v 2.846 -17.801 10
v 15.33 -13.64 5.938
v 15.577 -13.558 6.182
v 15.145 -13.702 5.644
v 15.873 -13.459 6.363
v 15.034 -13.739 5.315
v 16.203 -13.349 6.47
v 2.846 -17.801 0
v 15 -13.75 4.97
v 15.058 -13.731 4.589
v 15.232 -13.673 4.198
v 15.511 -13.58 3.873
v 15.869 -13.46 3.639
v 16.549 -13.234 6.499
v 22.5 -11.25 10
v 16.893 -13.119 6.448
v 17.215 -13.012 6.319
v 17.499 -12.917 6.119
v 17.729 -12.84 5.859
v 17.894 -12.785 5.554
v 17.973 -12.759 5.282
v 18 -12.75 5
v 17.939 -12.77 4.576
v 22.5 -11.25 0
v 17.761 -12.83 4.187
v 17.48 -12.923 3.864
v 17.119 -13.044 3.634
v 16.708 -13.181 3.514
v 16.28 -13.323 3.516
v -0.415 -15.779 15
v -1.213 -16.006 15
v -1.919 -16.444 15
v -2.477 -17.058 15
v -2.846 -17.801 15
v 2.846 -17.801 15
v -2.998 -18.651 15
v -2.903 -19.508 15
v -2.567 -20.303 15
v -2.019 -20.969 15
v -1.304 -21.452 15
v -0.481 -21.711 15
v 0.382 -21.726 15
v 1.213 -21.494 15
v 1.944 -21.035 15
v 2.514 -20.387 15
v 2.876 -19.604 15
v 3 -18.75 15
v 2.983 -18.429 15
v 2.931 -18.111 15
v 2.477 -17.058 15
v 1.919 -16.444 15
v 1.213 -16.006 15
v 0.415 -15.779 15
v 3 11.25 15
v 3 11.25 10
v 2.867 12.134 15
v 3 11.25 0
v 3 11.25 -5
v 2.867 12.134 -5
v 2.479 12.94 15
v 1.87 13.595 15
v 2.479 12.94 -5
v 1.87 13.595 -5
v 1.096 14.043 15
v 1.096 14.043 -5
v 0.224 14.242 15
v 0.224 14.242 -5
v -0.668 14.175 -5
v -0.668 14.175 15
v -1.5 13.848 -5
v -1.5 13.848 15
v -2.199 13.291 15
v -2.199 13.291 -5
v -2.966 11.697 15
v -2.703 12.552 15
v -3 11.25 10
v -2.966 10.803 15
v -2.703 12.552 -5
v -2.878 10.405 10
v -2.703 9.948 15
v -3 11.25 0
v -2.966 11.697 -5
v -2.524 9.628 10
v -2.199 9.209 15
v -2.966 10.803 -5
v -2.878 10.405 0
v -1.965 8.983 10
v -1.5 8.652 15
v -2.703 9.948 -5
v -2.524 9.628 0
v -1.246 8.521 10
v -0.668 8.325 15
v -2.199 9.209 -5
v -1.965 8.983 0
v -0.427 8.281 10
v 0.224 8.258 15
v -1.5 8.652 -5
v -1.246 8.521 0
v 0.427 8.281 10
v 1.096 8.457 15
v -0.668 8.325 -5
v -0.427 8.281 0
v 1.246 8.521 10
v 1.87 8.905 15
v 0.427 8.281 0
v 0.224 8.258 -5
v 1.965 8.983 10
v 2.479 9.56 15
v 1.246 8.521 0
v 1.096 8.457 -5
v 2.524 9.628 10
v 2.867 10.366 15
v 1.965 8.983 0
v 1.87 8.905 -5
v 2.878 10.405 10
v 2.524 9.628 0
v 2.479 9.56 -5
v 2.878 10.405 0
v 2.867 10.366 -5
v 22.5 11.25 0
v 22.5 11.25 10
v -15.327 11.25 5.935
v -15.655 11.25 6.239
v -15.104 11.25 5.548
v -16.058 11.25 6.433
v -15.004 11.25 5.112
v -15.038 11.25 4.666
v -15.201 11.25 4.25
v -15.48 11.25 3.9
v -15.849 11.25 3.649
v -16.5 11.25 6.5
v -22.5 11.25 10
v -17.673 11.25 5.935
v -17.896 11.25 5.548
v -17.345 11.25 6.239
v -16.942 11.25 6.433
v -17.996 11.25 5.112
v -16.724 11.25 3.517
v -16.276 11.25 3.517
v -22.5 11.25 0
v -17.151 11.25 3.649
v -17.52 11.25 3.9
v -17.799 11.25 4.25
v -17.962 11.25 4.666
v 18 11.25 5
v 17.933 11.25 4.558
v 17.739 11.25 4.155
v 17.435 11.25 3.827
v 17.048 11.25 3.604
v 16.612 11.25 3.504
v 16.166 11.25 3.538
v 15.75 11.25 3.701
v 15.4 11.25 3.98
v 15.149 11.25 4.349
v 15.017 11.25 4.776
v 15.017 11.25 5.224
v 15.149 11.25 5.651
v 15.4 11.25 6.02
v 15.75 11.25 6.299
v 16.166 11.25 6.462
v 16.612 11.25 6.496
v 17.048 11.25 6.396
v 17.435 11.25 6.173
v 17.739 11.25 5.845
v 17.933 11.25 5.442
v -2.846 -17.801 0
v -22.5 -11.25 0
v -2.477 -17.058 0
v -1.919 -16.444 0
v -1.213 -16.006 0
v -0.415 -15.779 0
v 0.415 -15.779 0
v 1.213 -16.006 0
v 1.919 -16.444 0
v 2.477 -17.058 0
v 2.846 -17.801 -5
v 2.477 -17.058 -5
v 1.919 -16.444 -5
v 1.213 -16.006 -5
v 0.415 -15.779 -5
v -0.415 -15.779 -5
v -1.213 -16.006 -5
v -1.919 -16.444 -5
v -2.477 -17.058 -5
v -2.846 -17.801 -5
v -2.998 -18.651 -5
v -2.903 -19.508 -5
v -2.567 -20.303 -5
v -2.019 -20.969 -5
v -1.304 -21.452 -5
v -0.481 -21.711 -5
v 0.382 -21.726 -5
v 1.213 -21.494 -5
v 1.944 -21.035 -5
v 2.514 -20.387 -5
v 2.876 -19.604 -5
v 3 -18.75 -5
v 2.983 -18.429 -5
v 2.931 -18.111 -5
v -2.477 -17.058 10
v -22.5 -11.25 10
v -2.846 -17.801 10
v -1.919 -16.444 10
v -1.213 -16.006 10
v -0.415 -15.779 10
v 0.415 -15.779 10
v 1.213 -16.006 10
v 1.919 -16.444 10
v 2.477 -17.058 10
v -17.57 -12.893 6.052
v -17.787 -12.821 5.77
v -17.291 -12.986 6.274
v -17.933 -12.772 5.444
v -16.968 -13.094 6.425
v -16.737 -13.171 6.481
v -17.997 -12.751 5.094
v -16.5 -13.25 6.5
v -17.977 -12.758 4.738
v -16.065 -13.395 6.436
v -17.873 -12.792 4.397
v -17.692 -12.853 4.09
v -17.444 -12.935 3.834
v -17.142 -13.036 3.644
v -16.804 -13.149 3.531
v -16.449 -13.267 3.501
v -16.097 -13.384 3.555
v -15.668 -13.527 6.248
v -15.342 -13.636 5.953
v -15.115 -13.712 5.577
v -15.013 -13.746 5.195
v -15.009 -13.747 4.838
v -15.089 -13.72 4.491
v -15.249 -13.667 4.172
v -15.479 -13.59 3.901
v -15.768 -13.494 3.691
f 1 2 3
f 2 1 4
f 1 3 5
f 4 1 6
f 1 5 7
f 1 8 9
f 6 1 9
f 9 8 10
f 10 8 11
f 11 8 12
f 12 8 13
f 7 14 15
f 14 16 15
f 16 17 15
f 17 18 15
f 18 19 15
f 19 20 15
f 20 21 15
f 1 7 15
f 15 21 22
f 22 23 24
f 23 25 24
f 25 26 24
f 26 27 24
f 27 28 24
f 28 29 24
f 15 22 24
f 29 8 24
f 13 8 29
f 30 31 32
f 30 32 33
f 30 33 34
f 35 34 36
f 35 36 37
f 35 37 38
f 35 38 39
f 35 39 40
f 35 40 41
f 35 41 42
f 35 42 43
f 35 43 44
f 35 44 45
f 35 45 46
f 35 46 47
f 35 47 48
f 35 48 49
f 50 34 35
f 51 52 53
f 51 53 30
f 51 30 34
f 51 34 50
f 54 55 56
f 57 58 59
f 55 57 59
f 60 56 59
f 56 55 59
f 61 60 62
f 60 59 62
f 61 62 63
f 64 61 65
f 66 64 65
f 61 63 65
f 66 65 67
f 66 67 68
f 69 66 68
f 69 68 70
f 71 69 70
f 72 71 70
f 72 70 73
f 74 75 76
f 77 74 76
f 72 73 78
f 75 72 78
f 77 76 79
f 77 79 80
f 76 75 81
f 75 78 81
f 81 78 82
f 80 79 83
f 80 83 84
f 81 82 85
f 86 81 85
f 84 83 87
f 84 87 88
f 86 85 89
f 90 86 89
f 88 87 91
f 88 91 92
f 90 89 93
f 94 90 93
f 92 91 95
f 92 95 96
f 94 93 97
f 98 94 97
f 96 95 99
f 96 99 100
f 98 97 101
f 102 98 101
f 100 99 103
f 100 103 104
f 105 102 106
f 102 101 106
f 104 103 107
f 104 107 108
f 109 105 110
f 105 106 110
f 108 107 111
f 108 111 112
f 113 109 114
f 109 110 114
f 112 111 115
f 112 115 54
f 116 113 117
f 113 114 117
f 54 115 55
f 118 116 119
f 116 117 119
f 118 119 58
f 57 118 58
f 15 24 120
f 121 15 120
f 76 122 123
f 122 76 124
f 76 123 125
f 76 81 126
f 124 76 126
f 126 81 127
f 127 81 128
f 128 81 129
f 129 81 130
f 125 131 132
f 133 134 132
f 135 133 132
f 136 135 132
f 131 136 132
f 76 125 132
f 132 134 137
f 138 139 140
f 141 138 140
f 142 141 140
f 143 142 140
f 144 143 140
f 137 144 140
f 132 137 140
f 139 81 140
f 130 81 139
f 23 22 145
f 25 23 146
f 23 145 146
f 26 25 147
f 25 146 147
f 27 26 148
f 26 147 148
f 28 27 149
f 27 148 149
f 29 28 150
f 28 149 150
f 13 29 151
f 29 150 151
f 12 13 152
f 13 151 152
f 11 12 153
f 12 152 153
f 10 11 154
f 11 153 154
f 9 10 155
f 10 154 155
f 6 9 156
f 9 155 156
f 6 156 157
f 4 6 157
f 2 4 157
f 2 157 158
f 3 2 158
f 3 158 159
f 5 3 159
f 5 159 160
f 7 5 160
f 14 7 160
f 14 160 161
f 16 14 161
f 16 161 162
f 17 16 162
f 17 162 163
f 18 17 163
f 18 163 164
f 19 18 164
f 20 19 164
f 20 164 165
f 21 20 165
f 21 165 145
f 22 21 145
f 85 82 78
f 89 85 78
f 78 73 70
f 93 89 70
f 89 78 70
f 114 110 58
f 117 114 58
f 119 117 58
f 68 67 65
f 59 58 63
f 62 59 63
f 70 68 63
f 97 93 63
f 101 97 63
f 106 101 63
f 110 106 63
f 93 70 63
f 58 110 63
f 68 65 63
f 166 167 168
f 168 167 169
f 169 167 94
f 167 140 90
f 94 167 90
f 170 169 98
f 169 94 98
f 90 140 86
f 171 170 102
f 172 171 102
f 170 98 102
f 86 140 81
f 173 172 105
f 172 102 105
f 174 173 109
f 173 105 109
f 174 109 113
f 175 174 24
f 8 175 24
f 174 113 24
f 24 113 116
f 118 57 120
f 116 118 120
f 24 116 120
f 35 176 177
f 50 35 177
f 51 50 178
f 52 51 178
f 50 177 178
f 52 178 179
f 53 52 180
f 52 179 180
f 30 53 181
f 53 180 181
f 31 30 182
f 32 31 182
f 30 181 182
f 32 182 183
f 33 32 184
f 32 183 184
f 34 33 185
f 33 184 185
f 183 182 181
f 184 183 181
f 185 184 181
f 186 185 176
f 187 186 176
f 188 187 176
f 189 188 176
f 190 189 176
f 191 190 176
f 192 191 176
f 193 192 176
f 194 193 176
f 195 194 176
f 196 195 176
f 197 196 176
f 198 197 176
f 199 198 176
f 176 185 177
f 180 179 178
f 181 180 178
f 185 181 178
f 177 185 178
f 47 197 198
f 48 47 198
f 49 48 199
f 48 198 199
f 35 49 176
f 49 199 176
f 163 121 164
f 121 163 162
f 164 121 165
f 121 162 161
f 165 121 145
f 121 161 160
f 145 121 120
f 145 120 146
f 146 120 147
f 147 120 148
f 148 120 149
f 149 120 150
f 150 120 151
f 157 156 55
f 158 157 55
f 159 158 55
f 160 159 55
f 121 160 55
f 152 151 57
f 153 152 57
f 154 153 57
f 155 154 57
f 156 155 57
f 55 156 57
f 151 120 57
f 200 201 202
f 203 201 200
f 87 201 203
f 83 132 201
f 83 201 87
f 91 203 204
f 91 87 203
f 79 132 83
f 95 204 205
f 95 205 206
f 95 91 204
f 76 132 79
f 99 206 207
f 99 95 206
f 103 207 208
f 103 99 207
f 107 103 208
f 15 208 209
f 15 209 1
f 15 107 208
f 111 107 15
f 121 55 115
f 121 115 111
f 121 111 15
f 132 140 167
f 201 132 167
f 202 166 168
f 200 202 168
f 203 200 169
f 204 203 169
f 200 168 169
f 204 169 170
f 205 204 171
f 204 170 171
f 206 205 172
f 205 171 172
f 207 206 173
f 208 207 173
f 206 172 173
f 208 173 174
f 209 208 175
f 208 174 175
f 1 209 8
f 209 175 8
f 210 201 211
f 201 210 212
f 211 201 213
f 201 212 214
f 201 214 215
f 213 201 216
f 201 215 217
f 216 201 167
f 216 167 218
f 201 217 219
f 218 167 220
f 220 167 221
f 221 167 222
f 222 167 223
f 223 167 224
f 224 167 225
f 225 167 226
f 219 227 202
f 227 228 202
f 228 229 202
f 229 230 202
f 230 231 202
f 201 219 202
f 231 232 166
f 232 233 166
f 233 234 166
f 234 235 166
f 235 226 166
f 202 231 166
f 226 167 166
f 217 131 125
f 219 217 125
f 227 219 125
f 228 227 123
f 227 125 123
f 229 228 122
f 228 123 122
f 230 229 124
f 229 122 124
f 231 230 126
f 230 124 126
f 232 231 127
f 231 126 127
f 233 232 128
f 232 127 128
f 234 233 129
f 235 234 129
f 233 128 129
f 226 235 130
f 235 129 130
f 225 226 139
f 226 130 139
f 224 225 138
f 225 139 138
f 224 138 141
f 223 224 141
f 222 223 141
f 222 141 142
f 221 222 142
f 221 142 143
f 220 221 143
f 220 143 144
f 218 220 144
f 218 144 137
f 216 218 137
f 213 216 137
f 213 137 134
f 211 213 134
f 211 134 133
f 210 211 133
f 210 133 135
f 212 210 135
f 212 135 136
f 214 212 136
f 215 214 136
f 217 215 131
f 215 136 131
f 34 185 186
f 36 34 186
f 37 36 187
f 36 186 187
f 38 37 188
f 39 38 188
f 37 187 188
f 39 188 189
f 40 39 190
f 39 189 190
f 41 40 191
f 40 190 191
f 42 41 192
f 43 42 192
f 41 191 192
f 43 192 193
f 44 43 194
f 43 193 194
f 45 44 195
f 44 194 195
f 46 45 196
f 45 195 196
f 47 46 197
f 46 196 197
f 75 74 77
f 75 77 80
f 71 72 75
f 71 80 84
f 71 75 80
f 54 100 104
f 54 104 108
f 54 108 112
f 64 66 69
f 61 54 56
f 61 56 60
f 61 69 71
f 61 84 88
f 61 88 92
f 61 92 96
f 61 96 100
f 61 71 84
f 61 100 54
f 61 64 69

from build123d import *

# Parameters (mm, degrees)
BOSS_EXTRUDE1_DEPTH      = 10
BOSS_EXTRUDE2_DEPTH      = 15
BOSS_EXTRUDE2_DEPTH_BACK = 5
SKETCH1_3_R              = 3
SKETCH2_R                = 1.5
CUT_EXTRUDE1_DEPTH       = 43.66438796
BOSS_EXTRUDE3_DEPTH      = 5
BOSS_EXTRUDE3_DEPTH_BACK = 15
SKETCH3_R                = 3


with BuildPart() as part:
    # Sketch1 → Boss-Extrude1 (new body)
    with BuildSketch(Plane.XY):
        with BuildLine():
            ThreePointArc((-2.846049894, -17.801316702), (0, -15.75), (2.846049894, -17.801316702))
            Line((2.846049894, -17.801316702), (22.5, -11.25))
            Line((22.5, -11.25), (22.5, 11.25))
            Line((22.5, 11.25), (-22.5, 11.25))
            Line((-22.5, 11.25), (-22.5, -11.25))
            Line((-22.5, -11.25), (-2.846049894, -17.801316702))
        make_face()
    extrude(amount=BOSS_EXTRUDE1_DEPTH)

    # Sketch2 → Cut-Extrude1 (cut, through all)
    with BuildSketch(Plane(origin=(0, 11.25, 0), x_dir=(1, 0, 0), z_dir=(0, 1, 0))):
        with Locations((-16.5, -5)):
            Circle(SKETCH2_R)
        with Locations((16.5, -5)):
            Circle(SKETCH2_R)
    extrude(amount=-CUT_EXTRUDE1_DEPTH, mode=Mode.SUBTRACT)

    # Sketch3 → Boss-Extrude3 (add, two sides: drawn at the far end of the back side and taken through both)
    with BuildSketch(Plane.XY.offset(10).offset(-BOSS_EXTRUDE3_DEPTH_BACK)):
        with Locations((0, 11.25)):
            Circle(SKETCH3_R)
    extrude(amount=BOSS_EXTRUDE3_DEPTH + BOSS_EXTRUDE3_DEPTH_BACK)


with BuildPart() as body_2:
    # Sketch1<3> → Boss-Extrude2 (new, two sides: drawn at the far end of the back side and taken through both)
    with BuildSketch(Plane.XY.offset(-BOSS_EXTRUDE2_DEPTH_BACK)):
        with Locations((0, -18.75)):
            Circle(SKETCH1_3_R)
    extrude(amount=BOSS_EXTRUDE2_DEPTH + BOSS_EXTRUDE2_DEPTH_BACK)


solid = Compound([part.part, body_2.part])
